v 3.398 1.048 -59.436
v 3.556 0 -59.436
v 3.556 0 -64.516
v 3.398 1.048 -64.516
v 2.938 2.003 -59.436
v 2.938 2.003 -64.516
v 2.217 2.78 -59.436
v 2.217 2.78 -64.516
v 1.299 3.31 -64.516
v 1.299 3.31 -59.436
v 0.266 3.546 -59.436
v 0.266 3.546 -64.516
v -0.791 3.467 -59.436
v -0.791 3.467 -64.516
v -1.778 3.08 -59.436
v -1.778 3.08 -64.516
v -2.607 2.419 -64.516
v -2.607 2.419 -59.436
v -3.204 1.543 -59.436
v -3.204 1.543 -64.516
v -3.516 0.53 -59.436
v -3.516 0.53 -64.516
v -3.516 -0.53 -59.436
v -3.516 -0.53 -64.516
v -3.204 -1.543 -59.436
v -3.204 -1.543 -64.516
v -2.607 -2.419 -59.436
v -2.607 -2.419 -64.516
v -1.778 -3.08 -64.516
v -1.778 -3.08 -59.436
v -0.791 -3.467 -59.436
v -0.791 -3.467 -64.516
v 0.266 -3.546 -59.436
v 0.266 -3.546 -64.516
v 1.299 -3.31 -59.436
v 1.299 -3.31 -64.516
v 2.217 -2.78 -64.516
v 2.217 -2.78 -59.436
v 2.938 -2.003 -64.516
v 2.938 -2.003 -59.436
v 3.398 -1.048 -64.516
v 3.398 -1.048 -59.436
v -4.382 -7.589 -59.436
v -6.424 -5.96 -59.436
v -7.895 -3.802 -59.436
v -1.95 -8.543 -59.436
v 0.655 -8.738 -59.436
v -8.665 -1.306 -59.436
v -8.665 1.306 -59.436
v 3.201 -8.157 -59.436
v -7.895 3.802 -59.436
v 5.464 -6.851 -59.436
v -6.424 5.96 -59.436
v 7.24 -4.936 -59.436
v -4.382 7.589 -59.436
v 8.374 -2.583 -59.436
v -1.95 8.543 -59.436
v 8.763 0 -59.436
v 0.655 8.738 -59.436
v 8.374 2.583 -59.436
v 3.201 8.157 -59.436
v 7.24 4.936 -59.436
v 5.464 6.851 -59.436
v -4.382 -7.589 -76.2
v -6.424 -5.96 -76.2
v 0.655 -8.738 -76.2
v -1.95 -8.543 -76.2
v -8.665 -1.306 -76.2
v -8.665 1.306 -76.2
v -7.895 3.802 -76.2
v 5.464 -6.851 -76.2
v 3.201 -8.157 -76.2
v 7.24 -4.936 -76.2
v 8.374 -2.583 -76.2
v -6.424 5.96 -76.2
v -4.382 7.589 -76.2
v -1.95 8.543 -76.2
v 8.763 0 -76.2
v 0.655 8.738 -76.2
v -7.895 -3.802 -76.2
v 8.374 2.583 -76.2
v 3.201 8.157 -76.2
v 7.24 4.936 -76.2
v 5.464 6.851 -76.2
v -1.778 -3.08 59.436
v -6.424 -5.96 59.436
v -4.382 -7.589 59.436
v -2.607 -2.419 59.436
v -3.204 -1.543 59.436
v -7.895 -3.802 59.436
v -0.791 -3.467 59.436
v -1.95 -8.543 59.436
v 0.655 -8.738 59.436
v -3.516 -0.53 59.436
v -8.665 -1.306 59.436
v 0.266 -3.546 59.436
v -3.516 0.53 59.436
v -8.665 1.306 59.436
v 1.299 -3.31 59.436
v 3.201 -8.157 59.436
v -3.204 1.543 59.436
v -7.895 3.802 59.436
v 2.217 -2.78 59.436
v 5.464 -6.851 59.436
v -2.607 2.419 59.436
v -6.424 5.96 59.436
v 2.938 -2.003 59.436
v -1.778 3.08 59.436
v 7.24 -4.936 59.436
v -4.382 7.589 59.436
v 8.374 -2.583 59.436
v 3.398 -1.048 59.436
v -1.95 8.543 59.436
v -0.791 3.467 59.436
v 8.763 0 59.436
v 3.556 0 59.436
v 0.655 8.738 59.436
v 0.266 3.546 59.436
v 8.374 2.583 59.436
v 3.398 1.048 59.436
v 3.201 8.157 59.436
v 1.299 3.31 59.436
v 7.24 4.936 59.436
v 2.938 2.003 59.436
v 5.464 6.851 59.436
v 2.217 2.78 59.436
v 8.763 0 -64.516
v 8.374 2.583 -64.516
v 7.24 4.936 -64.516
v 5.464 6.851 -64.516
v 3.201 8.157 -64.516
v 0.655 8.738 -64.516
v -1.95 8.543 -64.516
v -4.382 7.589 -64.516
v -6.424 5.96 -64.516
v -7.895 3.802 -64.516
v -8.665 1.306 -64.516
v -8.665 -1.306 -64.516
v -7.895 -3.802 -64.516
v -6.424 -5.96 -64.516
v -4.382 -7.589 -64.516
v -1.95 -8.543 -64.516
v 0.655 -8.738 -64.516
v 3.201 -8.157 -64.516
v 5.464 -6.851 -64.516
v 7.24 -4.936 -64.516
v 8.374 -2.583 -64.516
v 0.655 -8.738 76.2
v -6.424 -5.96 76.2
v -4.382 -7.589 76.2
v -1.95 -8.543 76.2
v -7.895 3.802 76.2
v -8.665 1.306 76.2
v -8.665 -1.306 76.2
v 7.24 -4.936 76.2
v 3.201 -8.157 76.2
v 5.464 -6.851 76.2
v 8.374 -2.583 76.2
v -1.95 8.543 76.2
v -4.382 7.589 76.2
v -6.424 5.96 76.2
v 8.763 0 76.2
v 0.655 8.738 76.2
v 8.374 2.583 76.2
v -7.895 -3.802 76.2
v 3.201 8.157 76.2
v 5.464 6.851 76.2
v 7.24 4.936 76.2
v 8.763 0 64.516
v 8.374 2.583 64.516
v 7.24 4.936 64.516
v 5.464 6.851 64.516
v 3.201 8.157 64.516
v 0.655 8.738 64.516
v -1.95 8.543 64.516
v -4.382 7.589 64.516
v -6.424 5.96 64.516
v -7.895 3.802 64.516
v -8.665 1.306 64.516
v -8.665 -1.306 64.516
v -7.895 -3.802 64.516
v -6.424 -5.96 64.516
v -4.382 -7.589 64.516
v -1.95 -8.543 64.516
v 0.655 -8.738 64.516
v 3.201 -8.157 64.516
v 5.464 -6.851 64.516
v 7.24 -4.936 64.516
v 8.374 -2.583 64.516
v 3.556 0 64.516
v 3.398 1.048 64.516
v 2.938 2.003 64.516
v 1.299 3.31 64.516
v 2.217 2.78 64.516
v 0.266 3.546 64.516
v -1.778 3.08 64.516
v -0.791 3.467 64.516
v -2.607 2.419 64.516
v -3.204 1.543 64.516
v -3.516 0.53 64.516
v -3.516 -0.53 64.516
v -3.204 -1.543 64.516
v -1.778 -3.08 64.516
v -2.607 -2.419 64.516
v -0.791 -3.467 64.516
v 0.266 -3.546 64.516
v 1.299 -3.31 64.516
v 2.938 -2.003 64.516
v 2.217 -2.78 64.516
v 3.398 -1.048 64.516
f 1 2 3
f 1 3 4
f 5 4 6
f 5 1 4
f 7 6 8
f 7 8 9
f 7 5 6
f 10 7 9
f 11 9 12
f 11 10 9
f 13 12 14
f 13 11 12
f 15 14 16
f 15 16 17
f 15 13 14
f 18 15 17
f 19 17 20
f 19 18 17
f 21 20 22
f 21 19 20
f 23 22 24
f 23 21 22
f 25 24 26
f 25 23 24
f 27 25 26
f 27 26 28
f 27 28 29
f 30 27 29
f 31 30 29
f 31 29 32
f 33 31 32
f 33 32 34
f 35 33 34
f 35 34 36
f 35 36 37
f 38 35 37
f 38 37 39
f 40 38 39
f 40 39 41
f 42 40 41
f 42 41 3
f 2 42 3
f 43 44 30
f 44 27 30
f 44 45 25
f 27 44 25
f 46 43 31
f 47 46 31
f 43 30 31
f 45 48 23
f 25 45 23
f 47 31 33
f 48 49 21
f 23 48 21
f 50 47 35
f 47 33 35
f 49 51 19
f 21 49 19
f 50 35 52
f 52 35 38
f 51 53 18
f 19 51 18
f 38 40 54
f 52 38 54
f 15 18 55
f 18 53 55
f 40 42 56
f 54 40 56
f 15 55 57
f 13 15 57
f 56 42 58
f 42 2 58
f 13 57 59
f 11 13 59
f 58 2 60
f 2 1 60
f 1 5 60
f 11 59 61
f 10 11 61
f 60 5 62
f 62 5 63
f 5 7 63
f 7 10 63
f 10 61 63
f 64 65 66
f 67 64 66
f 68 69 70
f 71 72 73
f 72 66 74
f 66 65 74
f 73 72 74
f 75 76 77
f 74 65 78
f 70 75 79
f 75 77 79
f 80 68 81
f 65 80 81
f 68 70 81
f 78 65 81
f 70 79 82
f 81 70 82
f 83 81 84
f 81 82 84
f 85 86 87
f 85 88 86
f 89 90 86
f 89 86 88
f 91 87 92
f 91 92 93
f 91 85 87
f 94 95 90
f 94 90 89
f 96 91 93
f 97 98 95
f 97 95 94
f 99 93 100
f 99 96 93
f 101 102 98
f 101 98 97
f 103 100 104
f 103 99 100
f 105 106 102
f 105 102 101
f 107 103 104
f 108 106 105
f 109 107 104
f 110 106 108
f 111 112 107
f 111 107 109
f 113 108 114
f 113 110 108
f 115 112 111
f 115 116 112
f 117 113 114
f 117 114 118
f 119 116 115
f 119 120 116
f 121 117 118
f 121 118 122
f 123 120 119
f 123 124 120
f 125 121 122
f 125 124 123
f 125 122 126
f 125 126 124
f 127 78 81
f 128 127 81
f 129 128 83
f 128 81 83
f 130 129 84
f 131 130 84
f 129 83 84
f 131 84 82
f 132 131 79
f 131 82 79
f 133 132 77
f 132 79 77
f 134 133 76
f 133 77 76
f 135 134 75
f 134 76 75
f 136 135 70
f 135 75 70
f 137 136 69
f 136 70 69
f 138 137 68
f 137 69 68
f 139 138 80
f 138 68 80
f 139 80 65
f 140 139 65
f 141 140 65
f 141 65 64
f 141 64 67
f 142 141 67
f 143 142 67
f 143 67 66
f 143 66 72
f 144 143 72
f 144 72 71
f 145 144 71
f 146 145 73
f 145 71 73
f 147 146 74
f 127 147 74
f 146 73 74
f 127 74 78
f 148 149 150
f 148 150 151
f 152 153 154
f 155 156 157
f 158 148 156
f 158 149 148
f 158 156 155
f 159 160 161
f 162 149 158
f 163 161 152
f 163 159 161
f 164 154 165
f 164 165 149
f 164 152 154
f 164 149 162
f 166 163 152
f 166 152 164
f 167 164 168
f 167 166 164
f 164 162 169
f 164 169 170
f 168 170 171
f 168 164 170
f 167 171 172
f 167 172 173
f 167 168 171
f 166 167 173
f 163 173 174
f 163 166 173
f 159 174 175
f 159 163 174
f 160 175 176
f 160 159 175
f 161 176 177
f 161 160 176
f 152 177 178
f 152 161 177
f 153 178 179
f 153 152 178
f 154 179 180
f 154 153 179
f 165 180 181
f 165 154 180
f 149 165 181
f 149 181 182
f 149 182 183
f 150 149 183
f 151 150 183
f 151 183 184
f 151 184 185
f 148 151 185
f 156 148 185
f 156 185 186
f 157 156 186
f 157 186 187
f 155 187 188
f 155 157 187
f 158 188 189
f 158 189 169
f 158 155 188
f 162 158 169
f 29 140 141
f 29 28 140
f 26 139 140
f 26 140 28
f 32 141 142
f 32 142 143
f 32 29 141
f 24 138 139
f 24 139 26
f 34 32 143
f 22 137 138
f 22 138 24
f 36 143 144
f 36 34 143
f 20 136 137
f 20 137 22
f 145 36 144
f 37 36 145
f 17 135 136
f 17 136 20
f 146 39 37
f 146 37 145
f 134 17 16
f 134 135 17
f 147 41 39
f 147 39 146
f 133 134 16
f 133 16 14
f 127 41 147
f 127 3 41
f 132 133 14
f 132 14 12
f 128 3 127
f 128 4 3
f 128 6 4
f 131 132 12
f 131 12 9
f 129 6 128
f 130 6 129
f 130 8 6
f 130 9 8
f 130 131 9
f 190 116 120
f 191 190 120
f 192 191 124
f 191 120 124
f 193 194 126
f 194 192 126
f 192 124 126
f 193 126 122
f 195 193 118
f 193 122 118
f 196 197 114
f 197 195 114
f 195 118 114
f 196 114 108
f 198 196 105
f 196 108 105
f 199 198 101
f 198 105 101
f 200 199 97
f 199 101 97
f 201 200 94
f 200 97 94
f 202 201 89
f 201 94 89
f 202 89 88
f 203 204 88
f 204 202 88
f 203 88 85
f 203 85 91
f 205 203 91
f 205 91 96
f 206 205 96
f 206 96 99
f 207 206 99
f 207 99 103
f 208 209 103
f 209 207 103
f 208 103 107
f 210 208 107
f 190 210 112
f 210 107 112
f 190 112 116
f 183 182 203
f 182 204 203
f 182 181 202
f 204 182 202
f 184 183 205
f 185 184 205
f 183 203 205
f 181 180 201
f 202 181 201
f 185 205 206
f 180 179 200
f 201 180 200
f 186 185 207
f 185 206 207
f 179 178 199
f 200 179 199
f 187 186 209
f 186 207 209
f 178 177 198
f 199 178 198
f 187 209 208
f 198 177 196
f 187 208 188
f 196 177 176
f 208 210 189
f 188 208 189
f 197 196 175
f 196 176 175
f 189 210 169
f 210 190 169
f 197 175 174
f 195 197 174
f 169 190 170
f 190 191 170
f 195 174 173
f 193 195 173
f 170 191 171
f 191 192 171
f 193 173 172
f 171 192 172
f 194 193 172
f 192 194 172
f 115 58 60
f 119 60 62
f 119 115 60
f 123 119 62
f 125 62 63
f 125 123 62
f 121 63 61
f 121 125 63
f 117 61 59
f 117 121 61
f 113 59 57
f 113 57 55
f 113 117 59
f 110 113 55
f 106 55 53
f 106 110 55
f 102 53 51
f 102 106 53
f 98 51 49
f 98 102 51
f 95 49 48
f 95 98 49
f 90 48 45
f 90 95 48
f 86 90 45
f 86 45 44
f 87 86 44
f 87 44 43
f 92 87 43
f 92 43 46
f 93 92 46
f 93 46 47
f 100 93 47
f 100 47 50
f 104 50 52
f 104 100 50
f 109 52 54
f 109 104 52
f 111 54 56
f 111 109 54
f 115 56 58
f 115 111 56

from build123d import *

# Parameters (mm, degrees)
F0_R          = 8.763
F1_DEPTH      = 59.436
F1_DEPTH_BACK = 59.436
F2_R          = 3.556
F3_DEPTH      = 76.2
F3_DEPTH_BACK = 76.2
F6_R          = 8.763
F7_DEPTH      = 11.684
F8_R          = 8.763
F9_DEPTH      = 11.684


with BuildPart() as f1:
    # F0 (on Top) → F1 (new body, two sides)
    with BuildSketch(Plane.XY) as f1_sk:
        Circle(F0_R)
    extrude(amount=F1_DEPTH)
    extrude(f1_sk.sketch, amount=-F1_DEPTH_BACK)

    # F2 (on Top) → F3 (join, two sides)
    with BuildSketch(Plane.XY) as f3_sk:
        Circle(F2_R)
    extrude(amount=F3_DEPTH)
    extrude(f3_sk.sketch, amount=-F3_DEPTH_BACK)

    # F6 (on offset) → F7 (join)
    with BuildSketch(Plane.XY.offset(76.2)):
        Circle(F6_R)
    extrude(amount=-F7_DEPTH)

    # F8 (on offset) → F9 (join)
    with BuildSketch(Plane.XY.offset(-76.2)):
        Circle(F8_R)
    extrude(amount=F9_DEPTH)


solid = f1.part
